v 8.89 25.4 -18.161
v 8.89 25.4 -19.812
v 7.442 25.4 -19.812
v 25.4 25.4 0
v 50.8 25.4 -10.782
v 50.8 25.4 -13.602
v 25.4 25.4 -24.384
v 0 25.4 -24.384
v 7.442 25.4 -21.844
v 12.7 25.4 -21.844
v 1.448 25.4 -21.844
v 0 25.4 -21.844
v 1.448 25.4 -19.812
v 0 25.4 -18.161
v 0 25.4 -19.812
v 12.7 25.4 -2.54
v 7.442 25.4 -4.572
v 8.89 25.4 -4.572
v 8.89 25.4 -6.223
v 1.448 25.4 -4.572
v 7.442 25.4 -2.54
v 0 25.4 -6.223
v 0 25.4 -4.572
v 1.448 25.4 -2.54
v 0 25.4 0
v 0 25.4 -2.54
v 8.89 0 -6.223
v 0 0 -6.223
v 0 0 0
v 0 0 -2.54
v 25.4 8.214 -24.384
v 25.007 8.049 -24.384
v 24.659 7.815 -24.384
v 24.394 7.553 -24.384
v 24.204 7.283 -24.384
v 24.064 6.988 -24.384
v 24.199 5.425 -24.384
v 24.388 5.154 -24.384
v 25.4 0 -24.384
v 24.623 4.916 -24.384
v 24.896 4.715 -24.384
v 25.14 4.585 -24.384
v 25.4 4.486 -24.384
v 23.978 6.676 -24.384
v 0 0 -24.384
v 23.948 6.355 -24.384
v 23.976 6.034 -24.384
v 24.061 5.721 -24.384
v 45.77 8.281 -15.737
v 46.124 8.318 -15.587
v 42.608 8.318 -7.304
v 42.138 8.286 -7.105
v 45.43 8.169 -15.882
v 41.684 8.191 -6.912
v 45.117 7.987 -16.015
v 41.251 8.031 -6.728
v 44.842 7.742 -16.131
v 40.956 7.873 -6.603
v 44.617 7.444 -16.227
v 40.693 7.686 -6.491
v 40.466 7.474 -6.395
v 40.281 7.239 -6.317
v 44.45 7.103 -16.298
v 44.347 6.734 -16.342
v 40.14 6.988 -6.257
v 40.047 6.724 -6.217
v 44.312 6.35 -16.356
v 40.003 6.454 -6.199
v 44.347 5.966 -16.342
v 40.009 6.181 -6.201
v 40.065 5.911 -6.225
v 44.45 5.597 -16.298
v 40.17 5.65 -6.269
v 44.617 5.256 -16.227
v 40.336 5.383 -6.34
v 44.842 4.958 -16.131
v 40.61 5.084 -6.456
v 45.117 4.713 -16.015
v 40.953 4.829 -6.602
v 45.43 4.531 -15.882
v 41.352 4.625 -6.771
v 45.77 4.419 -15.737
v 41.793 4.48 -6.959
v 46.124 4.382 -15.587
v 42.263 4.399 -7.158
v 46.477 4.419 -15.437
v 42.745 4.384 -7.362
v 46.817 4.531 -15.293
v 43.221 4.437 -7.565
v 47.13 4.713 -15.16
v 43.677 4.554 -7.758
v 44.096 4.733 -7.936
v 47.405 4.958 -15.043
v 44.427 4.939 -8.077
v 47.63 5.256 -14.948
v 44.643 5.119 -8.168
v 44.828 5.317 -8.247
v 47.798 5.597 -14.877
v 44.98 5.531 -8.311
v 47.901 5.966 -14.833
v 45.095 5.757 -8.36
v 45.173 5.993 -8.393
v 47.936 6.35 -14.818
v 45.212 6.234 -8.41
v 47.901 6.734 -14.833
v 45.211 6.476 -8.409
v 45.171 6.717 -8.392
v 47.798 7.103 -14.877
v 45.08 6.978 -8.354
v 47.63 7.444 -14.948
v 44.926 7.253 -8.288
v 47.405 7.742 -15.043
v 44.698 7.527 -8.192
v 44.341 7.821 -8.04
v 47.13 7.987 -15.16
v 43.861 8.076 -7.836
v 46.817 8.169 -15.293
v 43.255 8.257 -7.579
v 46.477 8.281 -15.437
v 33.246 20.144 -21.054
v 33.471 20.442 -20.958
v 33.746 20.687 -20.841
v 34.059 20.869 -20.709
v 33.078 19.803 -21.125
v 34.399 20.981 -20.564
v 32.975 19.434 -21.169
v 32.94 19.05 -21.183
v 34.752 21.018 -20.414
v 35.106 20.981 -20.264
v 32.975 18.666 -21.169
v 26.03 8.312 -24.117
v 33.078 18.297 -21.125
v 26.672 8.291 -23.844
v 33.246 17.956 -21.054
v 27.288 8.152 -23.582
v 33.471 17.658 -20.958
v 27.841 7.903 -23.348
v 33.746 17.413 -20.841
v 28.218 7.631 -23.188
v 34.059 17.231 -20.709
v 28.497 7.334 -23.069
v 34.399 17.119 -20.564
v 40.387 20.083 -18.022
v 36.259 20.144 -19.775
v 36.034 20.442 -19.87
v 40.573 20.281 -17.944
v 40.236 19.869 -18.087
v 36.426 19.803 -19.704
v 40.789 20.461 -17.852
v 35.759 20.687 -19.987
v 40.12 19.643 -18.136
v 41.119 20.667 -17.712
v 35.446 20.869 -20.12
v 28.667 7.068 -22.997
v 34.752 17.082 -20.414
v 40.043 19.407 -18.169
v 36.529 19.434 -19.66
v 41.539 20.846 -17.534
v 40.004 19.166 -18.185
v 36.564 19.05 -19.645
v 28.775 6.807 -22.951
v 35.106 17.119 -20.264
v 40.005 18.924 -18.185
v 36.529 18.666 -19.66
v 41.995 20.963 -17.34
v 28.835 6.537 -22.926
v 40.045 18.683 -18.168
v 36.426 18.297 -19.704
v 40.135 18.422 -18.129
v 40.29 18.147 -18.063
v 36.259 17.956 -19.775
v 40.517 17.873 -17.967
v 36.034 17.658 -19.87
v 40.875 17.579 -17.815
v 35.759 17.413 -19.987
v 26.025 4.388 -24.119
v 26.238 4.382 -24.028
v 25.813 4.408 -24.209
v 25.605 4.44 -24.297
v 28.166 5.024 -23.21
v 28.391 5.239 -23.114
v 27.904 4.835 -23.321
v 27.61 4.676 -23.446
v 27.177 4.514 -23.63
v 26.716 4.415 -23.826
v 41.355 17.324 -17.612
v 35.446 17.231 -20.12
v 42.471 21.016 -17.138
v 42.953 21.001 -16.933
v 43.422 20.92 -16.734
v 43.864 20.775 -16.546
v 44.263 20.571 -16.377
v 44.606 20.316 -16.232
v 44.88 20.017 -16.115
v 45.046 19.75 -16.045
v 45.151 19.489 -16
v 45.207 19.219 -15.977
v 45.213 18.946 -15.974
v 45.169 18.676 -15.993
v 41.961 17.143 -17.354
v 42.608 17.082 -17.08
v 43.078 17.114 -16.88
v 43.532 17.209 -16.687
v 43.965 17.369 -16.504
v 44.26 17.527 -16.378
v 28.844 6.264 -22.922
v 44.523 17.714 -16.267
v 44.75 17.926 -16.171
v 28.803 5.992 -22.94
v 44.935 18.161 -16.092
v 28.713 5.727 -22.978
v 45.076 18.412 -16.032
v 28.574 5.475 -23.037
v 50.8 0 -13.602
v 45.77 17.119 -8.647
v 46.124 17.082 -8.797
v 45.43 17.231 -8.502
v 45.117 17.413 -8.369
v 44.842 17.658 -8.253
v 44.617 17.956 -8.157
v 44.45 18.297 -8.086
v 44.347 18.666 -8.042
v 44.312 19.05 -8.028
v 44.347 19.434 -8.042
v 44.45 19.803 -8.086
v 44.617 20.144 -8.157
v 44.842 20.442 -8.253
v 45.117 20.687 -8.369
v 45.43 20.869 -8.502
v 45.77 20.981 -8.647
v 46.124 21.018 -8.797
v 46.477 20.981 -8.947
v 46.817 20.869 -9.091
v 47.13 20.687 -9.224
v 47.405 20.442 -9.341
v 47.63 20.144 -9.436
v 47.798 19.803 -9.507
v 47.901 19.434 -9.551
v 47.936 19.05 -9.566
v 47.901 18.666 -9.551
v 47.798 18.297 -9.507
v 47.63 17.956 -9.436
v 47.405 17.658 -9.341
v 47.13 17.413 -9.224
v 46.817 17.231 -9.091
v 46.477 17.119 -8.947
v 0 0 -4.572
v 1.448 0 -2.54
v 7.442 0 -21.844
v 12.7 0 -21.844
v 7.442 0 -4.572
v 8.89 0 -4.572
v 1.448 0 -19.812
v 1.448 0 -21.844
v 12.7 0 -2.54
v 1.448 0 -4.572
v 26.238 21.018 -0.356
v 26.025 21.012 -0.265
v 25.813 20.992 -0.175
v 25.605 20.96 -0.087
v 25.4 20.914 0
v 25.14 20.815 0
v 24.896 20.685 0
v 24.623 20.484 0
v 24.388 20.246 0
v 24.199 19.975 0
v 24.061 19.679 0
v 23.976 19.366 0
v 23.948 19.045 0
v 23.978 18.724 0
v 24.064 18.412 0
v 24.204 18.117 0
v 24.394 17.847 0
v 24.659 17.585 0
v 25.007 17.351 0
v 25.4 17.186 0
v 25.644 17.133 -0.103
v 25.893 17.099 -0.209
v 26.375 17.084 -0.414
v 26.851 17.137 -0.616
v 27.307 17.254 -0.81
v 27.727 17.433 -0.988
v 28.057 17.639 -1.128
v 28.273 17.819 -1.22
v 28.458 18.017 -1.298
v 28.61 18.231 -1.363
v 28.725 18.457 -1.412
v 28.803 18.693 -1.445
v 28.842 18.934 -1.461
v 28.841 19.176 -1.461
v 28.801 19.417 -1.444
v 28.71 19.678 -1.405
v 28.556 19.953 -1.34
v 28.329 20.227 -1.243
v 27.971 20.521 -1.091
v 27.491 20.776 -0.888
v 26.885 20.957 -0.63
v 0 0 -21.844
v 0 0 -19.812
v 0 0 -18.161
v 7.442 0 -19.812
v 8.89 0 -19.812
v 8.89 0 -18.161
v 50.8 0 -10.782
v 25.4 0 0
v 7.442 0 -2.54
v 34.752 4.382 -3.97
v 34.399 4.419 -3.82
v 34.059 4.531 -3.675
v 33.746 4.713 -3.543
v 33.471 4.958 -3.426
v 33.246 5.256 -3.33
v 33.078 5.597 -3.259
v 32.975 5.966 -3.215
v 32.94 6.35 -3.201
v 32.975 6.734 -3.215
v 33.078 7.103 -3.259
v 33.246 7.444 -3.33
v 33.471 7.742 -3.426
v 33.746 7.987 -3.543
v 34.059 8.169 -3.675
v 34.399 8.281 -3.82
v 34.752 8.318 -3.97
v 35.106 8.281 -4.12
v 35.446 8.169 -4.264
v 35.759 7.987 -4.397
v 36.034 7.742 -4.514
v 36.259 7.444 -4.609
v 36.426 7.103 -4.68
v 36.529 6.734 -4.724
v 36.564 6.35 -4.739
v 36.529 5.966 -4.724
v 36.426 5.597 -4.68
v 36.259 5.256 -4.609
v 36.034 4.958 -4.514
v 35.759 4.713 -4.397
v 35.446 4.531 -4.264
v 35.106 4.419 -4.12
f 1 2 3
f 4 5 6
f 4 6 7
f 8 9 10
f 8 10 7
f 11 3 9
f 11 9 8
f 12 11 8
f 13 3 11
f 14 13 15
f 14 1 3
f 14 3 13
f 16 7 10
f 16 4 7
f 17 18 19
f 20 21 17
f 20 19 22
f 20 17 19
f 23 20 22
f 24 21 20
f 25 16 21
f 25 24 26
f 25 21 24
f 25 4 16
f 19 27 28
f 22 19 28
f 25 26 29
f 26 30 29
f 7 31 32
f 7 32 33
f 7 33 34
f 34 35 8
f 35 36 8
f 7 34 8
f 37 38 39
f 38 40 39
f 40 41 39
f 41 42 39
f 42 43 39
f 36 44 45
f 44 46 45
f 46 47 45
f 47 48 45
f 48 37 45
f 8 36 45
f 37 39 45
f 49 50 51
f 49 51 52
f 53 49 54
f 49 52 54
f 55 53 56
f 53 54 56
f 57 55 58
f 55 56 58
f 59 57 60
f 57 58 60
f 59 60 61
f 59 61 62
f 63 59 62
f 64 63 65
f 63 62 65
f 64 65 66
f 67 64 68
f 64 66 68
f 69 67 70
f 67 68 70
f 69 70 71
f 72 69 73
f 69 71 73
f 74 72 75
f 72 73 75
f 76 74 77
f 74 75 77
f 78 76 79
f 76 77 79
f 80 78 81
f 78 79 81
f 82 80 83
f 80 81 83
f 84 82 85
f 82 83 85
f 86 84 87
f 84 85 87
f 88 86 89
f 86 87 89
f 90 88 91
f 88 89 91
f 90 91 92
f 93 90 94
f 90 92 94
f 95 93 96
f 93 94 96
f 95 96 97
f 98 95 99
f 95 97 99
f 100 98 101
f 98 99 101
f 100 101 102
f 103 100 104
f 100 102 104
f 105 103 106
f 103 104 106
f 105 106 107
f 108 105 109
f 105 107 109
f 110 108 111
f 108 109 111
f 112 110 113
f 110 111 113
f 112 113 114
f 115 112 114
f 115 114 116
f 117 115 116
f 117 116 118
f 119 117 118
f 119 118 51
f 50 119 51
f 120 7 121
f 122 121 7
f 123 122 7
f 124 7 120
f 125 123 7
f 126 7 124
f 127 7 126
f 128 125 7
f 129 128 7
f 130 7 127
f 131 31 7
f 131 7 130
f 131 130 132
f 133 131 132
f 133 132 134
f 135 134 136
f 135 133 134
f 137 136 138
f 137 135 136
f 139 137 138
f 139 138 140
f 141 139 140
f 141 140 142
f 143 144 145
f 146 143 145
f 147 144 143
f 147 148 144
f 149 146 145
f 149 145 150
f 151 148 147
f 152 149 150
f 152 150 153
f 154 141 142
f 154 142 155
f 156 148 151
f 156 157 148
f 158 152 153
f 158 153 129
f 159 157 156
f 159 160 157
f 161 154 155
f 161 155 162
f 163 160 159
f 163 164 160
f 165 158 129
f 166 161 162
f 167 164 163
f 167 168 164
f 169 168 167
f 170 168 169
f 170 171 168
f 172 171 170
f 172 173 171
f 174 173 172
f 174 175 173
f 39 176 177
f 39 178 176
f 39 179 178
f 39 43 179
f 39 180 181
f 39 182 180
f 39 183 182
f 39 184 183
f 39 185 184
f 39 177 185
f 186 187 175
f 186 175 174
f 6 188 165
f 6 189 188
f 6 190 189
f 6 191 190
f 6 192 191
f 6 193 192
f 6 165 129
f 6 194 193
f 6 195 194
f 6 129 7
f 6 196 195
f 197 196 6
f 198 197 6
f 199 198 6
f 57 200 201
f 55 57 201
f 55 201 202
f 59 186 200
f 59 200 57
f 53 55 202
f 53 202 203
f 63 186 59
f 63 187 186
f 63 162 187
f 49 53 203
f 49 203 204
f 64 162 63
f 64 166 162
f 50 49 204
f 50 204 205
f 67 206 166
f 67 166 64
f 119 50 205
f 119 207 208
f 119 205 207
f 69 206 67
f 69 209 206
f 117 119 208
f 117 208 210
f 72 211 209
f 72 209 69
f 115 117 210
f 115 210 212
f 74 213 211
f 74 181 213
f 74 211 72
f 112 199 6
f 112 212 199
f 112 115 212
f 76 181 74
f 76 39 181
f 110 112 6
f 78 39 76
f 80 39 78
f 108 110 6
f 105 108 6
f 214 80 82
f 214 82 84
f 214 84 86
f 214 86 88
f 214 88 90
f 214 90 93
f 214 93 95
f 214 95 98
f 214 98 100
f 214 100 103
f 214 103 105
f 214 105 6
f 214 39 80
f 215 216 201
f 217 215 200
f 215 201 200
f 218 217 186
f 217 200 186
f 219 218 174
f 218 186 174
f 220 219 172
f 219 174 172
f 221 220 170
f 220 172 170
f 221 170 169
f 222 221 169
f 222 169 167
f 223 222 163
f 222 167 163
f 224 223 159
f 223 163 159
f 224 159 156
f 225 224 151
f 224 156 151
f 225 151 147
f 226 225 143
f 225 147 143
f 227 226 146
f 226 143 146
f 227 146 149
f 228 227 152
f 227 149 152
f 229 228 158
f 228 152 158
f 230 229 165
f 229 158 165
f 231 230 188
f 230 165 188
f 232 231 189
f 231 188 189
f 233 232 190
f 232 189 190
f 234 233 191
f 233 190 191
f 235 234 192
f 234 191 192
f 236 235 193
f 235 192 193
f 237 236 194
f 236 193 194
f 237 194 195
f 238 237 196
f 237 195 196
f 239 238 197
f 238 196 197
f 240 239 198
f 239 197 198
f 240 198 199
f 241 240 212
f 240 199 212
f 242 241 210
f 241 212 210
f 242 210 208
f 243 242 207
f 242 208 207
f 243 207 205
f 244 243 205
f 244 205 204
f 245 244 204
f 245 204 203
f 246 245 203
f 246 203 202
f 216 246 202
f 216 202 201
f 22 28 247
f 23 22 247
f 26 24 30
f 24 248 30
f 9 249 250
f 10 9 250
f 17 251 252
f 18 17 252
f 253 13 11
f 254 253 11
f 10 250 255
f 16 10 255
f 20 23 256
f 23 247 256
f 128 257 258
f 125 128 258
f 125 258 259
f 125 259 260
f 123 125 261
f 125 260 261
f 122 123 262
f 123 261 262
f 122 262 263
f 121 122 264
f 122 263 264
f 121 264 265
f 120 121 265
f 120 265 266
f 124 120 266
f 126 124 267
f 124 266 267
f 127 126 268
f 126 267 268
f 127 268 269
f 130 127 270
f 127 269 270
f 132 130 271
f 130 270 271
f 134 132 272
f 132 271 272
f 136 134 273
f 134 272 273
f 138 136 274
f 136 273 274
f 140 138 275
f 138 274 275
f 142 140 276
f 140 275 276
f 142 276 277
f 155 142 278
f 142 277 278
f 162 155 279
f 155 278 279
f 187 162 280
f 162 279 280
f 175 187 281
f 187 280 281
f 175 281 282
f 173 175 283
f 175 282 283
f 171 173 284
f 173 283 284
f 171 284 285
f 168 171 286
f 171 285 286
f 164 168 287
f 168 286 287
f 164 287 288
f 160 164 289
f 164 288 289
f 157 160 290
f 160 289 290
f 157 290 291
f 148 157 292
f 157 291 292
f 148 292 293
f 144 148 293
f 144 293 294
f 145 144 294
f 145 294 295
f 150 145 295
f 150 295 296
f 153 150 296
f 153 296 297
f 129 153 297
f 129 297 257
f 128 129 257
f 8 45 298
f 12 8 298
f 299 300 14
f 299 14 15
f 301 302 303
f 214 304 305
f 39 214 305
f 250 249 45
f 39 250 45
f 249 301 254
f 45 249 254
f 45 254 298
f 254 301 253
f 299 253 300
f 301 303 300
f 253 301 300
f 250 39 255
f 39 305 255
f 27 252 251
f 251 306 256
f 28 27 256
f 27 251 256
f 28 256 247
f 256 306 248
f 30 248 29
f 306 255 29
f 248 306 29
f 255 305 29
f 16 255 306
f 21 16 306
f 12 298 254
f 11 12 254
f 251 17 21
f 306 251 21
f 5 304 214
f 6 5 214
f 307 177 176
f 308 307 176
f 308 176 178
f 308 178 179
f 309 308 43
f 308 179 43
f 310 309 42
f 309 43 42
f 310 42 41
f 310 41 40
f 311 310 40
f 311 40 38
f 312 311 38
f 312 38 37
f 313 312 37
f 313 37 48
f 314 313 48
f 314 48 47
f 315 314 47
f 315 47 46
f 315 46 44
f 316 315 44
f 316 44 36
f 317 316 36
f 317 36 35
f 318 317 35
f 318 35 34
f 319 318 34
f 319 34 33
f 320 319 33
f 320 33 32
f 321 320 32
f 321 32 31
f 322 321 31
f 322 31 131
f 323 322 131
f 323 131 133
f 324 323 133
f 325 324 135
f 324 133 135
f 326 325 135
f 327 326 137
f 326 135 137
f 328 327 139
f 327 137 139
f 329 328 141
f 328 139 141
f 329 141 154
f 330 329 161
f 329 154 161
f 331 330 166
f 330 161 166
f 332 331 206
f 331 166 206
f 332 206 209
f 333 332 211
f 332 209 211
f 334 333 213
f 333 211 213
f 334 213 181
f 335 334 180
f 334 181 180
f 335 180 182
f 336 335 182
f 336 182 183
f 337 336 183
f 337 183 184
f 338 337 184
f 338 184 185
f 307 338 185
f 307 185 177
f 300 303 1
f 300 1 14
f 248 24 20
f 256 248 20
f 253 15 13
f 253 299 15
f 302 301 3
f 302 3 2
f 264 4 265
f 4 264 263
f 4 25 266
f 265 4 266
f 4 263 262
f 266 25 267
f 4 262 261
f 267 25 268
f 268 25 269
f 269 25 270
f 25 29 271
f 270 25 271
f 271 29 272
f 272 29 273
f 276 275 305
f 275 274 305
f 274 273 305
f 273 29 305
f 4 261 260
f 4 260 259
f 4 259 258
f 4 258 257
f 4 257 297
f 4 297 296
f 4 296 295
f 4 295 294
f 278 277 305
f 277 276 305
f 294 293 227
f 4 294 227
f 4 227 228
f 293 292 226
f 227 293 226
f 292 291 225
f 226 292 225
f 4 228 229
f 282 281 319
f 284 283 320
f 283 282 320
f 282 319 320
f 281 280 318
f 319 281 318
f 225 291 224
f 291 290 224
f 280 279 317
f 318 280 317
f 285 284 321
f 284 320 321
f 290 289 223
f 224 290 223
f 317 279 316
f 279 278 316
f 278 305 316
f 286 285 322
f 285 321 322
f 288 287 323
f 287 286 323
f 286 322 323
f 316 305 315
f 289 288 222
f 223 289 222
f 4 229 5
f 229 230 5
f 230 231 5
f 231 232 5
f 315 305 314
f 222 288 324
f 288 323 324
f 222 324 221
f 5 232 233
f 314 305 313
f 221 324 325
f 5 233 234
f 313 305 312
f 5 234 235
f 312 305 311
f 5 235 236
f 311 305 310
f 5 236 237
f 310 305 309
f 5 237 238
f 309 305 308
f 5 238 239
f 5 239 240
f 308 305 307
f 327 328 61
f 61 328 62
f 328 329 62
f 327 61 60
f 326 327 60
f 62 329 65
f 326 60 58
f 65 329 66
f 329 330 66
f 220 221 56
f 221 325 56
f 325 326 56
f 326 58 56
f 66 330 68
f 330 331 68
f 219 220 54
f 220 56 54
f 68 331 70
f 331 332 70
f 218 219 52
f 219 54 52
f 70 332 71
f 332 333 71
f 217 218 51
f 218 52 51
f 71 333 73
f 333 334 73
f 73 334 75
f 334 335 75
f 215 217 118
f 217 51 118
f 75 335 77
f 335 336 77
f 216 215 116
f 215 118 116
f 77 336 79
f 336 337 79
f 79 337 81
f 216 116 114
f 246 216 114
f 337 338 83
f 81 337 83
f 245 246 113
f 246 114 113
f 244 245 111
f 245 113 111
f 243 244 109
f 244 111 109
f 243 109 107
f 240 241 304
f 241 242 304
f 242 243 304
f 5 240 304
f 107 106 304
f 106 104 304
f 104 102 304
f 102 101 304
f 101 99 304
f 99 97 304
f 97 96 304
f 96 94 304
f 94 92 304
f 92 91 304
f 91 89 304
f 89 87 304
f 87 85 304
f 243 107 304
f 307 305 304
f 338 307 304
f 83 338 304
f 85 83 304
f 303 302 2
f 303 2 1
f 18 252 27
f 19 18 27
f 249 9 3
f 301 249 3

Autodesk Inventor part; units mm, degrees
ref_plane "YZ Plane" through (0, 0, 0) normal (1, 0, 0) x (0, 1, 0)
ref_plane "XZ Plane" through (0, 0, 0) normal (0, 1, 0) x (-1, 0, 0)
ref_plane "XY Plane" through (0, 0, 0) normal (0, 0, 1) x (1, 0, 0)
sketch "Sketch1" plane through (0, 0, 0) normal (0, 1, 0) x (-1, 0, 0)
  line L0 (0, 0) -> (-12.7, 0)
  line L1 (-12.7, 0) -> (-12.7, -2.54)
  line L2 (-12.7, -2.54) -> (0, -2.54)
  line L3 (0, -2.54) -> (0, 0)
  line L4 (0, -21.844) -> (-12.7, -21.844)
  line L5 (-12.7, -21.844) -> (-12.7, -24.384)
  line L6 (-12.7, -24.384) -> (0, -24.384)
  line L7 (0, -24.384) -> (0, -21.844)
  line L8 (-12.7, 0) -> (-25.4, 0)
  line L9 (-25.4, 0) -> (-25.4, -24.384)
  line L10 (-25.4, -24.384) -> (-12.7, -24.384)
  line L11 (-12.7, -24.384) -> (-12.7, 0)
  line L12 (-25.4, 0) -> (-50.8, -10.7817)
  line L13 (-25.4, 0) -> (2.1936, 0) construction
  line L14 (-25.4, -24.384) -> (-50.8, -13.6023)
  line L15 (-25.4, -24.384) -> (2.1936, -24.384) construction
  line L16 (-50.8, -10.7817) -> (-50.8, -13.6023)
  line L17 (-1.4478, -4.572) -> (-7.4422, -4.572)
  line L18 (-7.4422, -4.572) -> (-7.4422, -2.54)
  line L19 (-7.4422, -2.54) -> (-1.4478, -2.54)
  line L20 (-1.4478, -2.54) -> (-1.4478, -4.572)
  line L21 (-1.4478, -21.844) -> (-7.4422, -21.844)
  line L22 (-7.4422, -21.844) -> (-7.4422, -19.812)
  line L23 (-7.4422, -19.812) -> (-1.4478, -19.812)
  line L24 (-1.4478, -19.812) -> (-1.4478, -21.844)
  line L25 (0, -19.812) -> (-8.89, -19.812)
  line L26 (-8.89, -19.812) -> (-8.89, -18.161)
  line L27 (-8.89, -18.161) -> (0, -18.161)
  line L28 (0, -18.161) -> (0, -19.812)
  line L29 (0, -4.572) -> (-8.89, -4.572)
  line L30 (-8.89, -4.572) -> (-8.89, -6.223)
  line L31 (-8.89, -6.223) -> (0, -6.223)
  line L32 (0, -6.223) -> (0, -4.572)
  dimension "d2" = 12.7
  dimension "d3" = 2.54
  dimension "d4" = 12.7
  dimension "d5" = 2.54
  dimension "d6" = 24.384
  dimension "d7" = 12.7
  dimension "d8" = 24.384
  dimension "d9" = 157
  dimension "d10" = 157
  dimension "d11" = 25.4
  dimension "d12" = 25.4
  dimension "d15" = 5.9944
  dimension "d16" = 2.032
  dimension "d17" = 2.032
  dimension "d18" = 1.4478
  dimension "d19" = 5.9944
  dimension "d20" = 2.032
  dimension "d21" = 1.4478
  dimension "d22" = 8.89
  dimension "d23" = 1.651
  dimension "d24" = 8.89
  dimension "d25" = 1.651
extrude "Extrusion1" add sketch "Sketch1" along normal blind 25.4
sketch "Sketch2" plane through (25.4, 0, -24.384) normal (0.3907, 0, -0.9205) x (-0.9205, 0, -0.3907)
  circle A0 centre (-10.16, 19.05) radius 1.9685
  circle A1 centre (-22.5136, 6.35) radius 1.9685
  line L0 (-27.5936, 0) -> (0, 0) projected
  line L1 (-27.5936, 0) -> (-27.5936, 25.4) projected
  line L2 (0, 0) -> (0, 25.4) projected
  line L3 (-27.5936, 25.4) -> (0, 25.4) projected
  point P0 (13.8532, 0)
  dimension "d28" = 3.937
  dimension "d29" = 3.937
  dimension "d30" = 6.35
  dimension "d31" = 5.08
  dimension "d32" = 10.16
  dimension "d33" = 6.35
hole "Hole1" at (34.7523, 19.05, -20.4142) at (46.1238, 6.35, -15.5873) direction (-0.3907, 0, 0.9205) diameter 3.937 end through all
sketch "Sketch3" plane through (50.8, 0, -10.7817) normal (0.3907, 0, 0.9205) x (0.9205, 0, -0.3907)
  circle A0 centre (-5.08, 19.05) radius 1.9685
  circle A1 centre (-17.4336, 6.35) radius 1.9685
  line L0 (-27.5936, 25.4) -> (0, 25.4) projected
  line L1 (0, 0) -> (0, 25.4) projected
  line L2 (-27.5936, 0) -> (0, 0) projected
  line L3 (-27.5936, 0) -> (-27.5936, 17.1859) projected
  point P0 (-50.9744, 0)
  dimension "d41" = 3.937
  dimension "d42" = 3.937
  dimension "d43" = 6.35
  dimension "d44" = 5.08
  dimension "d45" = 6.35
  dimension "d46" = 10.16
hole "Hole2" at (46.1238, 19.05, -8.7967) at (34.7523, 6.35, -3.9698) direction (-0.3907, 0, -0.9205) diameter 3.937 end through all
ref_plane "Work Plane1" through (47.8226, 0, -17.7959) normal (0.3907, 0, 0.9205) x (0.9205, 0, -0.3907)
properties part number "XRailSplitter"
